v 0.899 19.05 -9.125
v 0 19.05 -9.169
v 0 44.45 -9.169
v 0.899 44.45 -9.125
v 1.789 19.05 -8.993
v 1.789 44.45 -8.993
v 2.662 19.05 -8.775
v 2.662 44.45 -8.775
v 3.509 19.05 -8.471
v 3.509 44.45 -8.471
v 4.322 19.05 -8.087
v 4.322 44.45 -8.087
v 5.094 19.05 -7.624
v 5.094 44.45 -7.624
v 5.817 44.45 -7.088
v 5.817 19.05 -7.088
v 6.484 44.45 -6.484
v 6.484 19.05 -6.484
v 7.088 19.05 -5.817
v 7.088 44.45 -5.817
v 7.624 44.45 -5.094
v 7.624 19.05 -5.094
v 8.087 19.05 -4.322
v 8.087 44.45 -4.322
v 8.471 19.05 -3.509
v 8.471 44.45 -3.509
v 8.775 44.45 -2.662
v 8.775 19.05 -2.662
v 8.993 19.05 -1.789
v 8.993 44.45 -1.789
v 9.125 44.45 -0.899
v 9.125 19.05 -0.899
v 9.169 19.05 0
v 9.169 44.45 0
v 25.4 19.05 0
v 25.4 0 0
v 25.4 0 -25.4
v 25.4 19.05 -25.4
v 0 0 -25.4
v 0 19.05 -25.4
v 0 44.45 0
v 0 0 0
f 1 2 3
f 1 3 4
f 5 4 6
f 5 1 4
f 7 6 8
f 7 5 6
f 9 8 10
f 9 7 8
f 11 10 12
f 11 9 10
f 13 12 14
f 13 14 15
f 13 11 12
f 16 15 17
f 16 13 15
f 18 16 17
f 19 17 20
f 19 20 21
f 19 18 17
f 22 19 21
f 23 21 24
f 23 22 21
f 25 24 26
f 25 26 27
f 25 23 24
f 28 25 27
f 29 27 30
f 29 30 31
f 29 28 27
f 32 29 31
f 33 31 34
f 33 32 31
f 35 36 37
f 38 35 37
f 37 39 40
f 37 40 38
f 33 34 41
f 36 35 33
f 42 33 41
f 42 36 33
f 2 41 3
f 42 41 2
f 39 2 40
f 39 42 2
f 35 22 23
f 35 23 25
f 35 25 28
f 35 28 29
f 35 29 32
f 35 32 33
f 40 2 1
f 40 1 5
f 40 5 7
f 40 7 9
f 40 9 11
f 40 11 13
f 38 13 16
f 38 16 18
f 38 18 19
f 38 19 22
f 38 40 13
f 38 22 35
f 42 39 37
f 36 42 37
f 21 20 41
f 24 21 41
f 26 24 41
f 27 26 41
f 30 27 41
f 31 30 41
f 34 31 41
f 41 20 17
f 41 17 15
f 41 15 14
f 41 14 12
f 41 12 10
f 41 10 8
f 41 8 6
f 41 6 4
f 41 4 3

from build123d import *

# Parameters (mm, degrees)
SKETCH1_W           = 25.4
SKETCH1_H           = 25.4
BOSS_EXTRUDE1_DEPTH = 19.05
BOSS_EXTRUDE2_DEPTH = 25.4


with BuildPart() as part:
    # Sketch1 → Boss-Extrude1 (new body)
    with BuildSketch(Plane(origin=(0, 0, 0), x_dir=(1, 0, 0), z_dir=(0, 1, 0))):
        with Locations((12.7, 12.7)):
            Rectangle(SKETCH1_W, SKETCH1_H)
    extrude(amount=BOSS_EXTRUDE1_DEPTH)

    # Sketch3 → Boss-Extrude2 (add)
    with BuildSketch(Plane(origin=(0, 19.05, 0), x_dir=(1, 0, 0), z_dir=(0, 1, 0))):
        with BuildLine():
            Line((0, 0), (0, 9.1694))
            ThreePointArc((0, 9.1694), (6.483744919, 6.483744919), (9.1694, 0))
            Line((9.1694, 0), (0, 0))
        make_face()
    extrude(amount=BOSS_EXTRUDE2_DEPTH)


solid = part.part
